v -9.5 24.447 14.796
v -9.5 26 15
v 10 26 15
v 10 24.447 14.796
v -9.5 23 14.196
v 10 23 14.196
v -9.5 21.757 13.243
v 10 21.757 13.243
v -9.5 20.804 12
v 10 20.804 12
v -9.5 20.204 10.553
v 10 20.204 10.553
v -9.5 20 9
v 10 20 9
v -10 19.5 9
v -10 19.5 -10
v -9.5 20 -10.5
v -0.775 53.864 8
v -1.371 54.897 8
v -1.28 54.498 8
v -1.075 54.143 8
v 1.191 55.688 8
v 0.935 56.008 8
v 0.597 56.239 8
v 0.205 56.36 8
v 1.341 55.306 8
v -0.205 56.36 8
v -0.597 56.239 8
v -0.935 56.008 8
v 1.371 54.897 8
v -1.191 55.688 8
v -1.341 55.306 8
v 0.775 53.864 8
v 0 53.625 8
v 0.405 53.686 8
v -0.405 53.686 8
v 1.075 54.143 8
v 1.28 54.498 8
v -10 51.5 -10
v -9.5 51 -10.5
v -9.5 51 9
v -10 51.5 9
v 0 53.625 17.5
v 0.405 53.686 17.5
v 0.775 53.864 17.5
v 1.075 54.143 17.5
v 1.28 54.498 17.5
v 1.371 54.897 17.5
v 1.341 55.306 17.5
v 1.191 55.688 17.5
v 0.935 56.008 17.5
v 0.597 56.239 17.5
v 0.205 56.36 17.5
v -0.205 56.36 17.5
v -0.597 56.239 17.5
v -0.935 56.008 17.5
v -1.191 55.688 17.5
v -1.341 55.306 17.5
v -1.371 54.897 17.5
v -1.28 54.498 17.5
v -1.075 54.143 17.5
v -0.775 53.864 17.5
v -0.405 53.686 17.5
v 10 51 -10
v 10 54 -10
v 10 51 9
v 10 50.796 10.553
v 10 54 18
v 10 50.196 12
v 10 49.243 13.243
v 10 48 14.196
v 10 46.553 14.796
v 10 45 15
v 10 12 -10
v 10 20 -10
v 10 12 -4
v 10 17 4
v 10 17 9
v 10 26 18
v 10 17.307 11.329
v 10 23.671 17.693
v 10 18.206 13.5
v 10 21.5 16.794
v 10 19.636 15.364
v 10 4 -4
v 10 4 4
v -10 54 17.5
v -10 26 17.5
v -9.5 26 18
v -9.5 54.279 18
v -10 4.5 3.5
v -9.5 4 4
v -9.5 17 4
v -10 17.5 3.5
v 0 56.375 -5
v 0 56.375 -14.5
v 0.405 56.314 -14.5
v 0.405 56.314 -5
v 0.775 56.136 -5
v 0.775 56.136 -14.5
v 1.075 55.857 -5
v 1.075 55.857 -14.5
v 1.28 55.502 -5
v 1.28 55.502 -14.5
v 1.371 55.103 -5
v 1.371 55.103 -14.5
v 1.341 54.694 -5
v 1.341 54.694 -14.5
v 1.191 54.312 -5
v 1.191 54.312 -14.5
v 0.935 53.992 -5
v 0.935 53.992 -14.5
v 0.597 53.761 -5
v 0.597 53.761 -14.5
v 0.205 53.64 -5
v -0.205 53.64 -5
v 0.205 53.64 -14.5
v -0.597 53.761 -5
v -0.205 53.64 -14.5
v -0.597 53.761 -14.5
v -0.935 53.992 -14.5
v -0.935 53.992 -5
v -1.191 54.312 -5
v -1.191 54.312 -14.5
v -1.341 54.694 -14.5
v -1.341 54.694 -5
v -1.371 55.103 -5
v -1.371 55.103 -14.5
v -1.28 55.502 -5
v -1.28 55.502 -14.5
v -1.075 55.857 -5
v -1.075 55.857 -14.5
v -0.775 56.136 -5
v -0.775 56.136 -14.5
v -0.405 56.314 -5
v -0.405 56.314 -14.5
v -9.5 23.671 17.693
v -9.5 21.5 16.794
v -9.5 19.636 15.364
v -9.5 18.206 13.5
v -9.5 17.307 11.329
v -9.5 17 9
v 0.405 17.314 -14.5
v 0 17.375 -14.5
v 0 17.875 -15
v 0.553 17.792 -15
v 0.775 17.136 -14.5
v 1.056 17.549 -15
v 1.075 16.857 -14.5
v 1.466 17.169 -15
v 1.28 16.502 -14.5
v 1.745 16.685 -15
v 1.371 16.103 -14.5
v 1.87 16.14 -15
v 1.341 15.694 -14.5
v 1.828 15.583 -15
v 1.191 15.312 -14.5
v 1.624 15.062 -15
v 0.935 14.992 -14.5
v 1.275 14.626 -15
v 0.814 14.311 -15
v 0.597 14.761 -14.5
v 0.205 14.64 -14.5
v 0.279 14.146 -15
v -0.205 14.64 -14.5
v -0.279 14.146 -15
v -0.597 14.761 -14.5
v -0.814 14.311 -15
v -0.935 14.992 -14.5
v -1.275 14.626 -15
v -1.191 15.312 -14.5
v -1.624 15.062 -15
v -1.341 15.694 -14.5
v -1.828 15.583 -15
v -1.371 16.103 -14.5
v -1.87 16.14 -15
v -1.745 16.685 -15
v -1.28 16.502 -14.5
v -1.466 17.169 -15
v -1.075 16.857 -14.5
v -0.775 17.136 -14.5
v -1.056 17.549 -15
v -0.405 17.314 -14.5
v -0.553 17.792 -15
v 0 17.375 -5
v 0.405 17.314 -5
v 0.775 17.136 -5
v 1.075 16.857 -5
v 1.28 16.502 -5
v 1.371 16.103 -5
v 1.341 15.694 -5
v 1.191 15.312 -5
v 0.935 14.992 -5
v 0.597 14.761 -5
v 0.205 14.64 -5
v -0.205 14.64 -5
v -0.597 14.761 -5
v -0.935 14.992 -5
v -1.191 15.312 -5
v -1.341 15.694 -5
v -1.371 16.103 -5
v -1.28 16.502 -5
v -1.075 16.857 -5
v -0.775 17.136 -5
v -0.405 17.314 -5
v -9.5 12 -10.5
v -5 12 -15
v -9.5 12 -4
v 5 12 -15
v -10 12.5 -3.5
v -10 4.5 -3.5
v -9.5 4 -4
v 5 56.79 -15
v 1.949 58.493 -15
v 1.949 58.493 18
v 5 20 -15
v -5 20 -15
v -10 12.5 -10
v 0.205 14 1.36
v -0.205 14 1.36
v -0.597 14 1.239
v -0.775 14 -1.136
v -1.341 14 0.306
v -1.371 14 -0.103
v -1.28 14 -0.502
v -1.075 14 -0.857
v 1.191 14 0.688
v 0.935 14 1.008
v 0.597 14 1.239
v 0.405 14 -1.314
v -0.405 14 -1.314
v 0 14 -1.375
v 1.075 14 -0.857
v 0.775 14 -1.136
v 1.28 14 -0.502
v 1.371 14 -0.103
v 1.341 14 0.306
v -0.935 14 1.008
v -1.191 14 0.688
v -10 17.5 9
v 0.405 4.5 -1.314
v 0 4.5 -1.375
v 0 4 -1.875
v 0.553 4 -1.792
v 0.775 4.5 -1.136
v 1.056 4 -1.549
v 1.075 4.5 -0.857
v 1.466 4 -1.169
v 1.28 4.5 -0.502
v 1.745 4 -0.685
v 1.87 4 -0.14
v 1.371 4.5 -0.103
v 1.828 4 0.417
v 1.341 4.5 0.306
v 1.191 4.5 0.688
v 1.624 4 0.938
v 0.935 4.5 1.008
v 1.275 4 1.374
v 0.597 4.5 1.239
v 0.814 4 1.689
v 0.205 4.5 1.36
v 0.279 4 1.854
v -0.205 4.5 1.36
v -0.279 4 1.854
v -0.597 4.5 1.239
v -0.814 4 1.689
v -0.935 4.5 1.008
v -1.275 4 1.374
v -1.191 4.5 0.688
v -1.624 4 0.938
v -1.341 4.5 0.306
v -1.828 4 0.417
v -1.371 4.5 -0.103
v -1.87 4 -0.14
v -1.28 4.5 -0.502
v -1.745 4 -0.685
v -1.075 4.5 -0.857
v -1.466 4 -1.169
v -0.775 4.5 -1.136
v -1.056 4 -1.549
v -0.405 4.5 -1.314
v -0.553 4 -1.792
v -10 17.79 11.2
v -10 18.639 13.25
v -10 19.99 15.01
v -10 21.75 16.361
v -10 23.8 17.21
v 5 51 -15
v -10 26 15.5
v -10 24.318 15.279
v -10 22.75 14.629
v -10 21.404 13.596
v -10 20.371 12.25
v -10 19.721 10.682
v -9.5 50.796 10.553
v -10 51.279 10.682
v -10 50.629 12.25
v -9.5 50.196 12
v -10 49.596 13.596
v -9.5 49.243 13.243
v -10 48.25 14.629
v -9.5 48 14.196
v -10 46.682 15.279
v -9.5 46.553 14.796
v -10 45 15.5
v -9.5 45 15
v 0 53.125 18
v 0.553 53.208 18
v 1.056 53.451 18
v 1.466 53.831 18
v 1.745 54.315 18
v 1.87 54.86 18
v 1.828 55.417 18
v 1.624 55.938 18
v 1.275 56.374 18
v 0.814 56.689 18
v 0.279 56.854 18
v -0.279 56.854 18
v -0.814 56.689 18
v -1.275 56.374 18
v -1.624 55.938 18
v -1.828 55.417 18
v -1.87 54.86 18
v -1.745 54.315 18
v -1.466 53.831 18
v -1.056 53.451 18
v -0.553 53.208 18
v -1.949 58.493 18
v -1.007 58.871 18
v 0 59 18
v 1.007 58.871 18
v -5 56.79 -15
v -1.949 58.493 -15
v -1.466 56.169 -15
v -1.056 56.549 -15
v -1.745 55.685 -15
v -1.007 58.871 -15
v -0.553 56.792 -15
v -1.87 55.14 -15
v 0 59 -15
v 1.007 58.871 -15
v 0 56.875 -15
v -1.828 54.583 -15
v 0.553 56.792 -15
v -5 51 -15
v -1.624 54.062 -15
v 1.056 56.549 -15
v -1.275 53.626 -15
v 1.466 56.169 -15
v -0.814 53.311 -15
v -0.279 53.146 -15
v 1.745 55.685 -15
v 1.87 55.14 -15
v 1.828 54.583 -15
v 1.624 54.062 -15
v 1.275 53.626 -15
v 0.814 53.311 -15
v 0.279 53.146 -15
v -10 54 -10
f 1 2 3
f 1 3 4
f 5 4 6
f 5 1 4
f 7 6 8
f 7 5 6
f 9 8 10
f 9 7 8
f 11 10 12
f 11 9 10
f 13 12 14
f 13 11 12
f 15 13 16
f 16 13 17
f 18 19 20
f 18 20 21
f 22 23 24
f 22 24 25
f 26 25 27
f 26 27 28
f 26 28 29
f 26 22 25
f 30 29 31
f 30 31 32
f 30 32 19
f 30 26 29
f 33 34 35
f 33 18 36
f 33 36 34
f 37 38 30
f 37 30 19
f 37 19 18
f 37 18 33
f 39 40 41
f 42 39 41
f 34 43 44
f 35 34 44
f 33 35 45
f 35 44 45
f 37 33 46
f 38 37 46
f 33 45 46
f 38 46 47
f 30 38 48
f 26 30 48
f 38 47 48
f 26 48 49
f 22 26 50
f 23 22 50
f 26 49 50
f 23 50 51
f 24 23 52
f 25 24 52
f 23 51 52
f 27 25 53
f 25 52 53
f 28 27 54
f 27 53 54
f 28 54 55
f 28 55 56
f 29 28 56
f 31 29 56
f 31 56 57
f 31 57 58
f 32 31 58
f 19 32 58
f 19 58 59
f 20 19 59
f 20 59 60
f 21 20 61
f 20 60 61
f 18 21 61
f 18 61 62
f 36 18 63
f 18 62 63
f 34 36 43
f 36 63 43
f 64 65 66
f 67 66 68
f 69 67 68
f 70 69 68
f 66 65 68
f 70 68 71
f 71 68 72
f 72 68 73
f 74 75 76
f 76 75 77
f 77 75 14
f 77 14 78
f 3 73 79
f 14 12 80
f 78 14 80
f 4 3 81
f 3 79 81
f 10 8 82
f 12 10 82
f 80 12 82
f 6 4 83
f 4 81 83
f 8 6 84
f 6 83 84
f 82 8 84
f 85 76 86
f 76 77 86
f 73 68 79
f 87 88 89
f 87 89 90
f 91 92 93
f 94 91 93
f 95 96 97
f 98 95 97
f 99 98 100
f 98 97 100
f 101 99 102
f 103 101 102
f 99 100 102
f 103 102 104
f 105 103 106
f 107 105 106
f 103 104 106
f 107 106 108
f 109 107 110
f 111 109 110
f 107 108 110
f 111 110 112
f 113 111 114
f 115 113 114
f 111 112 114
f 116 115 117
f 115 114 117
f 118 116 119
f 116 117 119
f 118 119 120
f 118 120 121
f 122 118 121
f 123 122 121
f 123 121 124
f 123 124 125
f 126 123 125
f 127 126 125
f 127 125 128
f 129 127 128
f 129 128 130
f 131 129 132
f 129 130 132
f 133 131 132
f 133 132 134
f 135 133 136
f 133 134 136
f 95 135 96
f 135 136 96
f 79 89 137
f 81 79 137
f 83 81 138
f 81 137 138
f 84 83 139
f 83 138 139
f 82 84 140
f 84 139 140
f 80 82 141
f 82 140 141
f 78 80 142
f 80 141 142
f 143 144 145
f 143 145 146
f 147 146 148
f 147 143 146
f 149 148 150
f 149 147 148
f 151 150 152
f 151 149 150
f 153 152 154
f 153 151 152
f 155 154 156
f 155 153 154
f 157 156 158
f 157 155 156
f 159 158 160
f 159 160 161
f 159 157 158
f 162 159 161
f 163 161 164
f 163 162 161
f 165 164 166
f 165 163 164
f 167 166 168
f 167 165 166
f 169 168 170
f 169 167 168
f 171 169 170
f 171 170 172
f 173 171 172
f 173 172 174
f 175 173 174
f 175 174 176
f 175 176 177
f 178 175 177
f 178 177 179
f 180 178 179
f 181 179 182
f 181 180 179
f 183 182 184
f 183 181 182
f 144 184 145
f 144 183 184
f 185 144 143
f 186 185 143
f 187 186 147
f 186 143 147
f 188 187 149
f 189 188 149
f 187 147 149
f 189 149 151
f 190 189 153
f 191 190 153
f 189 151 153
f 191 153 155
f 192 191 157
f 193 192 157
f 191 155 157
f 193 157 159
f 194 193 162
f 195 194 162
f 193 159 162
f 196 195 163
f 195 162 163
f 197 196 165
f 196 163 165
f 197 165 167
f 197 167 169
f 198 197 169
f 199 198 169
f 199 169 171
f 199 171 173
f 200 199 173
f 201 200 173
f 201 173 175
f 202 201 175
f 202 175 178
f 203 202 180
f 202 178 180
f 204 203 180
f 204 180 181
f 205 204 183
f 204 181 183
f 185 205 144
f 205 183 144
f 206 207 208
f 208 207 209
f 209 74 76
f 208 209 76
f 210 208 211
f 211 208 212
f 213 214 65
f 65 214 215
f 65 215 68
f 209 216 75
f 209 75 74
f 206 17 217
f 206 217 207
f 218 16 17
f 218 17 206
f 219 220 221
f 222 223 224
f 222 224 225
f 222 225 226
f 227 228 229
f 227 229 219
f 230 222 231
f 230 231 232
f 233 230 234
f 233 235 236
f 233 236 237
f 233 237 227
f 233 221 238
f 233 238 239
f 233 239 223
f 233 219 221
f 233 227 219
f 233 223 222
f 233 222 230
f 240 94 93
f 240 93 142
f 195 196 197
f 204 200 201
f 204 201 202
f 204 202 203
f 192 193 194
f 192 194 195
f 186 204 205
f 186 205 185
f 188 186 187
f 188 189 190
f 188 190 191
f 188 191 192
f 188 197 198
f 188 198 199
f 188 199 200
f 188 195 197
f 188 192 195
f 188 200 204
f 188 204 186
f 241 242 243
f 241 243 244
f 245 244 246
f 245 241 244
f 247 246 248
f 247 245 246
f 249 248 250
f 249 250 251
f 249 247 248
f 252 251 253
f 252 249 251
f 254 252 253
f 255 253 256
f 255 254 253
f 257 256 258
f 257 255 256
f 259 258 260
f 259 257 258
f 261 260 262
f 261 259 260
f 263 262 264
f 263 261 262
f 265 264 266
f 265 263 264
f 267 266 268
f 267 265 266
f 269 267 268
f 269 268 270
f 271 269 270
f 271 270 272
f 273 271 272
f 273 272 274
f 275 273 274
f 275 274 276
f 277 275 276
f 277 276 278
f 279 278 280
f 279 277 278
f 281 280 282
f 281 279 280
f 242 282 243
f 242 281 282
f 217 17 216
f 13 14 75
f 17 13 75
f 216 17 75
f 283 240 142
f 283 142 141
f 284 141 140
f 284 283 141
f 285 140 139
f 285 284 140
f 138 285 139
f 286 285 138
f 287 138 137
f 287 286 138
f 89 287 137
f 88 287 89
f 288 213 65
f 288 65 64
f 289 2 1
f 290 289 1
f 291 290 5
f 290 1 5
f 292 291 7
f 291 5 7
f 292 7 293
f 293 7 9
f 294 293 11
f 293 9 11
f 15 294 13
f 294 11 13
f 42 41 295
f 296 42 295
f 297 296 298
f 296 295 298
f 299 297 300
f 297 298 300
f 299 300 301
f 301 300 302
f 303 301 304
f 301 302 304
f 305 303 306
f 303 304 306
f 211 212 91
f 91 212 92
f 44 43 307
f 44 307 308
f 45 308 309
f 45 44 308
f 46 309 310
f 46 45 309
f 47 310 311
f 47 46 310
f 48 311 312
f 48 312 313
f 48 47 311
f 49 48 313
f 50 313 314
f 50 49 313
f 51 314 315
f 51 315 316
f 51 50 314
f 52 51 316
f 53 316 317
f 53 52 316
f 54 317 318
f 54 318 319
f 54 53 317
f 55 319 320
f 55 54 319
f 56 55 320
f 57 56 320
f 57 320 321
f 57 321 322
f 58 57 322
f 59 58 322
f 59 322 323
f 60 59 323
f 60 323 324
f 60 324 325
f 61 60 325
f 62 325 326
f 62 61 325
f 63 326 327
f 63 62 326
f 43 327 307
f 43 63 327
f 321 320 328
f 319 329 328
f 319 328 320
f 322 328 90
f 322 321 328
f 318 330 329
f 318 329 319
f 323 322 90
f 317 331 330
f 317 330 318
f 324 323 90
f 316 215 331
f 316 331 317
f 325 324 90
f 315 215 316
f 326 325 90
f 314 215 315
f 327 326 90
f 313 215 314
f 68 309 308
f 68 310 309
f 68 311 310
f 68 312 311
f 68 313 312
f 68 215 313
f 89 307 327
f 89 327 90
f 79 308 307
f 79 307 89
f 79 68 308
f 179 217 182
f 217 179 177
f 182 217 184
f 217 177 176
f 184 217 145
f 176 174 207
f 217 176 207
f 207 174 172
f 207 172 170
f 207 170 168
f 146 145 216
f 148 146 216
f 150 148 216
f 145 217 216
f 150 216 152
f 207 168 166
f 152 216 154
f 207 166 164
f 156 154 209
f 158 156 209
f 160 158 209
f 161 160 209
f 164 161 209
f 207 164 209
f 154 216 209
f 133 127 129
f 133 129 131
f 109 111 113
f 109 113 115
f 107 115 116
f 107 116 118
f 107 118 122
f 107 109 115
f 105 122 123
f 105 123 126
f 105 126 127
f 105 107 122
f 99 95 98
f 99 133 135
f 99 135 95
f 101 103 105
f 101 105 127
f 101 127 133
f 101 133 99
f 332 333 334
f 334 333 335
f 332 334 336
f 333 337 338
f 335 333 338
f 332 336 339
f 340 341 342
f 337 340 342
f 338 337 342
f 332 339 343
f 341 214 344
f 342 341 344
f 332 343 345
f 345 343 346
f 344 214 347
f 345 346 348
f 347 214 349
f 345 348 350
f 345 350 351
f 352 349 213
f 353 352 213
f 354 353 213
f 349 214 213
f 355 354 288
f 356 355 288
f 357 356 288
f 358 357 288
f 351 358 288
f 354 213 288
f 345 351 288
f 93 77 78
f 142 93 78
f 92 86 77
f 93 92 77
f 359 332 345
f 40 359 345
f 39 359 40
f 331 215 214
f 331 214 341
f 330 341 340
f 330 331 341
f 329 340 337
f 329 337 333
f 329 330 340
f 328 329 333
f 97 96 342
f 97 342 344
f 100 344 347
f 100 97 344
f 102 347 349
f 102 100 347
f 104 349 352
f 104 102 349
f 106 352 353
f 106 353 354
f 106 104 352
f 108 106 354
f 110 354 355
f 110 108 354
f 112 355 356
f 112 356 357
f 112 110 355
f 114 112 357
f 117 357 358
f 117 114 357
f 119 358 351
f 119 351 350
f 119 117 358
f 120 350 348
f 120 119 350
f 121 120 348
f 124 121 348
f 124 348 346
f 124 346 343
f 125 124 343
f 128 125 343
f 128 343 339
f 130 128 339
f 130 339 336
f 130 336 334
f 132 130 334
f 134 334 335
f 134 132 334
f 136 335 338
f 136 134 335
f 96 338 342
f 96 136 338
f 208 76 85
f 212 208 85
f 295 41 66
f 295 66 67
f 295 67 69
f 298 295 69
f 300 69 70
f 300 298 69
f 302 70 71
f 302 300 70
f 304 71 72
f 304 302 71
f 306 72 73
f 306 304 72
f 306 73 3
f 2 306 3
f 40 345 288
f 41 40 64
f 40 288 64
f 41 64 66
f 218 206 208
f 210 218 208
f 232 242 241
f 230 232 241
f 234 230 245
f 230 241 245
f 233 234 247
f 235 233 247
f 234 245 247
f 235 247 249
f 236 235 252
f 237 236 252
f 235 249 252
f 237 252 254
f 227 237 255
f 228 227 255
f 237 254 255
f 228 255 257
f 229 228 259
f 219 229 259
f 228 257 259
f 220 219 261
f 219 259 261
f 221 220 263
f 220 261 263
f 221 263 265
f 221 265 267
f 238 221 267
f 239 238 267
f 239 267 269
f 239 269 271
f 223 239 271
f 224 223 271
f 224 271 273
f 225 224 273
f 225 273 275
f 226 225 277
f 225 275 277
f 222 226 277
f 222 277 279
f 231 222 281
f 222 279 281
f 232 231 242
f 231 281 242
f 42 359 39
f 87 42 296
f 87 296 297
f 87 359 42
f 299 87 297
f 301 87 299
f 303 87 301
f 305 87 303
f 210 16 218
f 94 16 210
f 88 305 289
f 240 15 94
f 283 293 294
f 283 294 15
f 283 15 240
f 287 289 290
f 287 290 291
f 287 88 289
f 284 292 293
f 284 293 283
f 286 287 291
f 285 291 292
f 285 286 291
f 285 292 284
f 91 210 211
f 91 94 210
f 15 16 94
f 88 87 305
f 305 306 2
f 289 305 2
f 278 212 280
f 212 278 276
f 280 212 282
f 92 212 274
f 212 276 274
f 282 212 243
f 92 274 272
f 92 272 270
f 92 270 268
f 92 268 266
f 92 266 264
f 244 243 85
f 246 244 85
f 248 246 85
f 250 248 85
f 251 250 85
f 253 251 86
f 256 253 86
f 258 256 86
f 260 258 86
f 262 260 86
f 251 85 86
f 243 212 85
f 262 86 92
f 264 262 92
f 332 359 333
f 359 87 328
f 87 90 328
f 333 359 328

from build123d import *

# Parameters (mm, degrees)
PAD_DEPTH       = 10
SKETCH001_R     = 1.375
POCKET_DEPTH    = 10
PAD001_DEPTH    = 33
SKETCH003_R     = 1.375
POCKET001_DEPTH = 10
SKETCH004_R     = 1.375
POCKET002_DEPTH = 10
FILLET_1_R      = 9
FILLET_2_R      = 6
CHAMFER_SIZE    = 5
CHAMFER001_SIZE = 0.5
CHAMFER002_SIZE = 0.5


with BuildPart() as part:
    # Sketch → Pad (new body, symmetric)
    with BuildSketch(Plane.YZ):
        Polygon((4, 4), (17, 4), (17, 18), (54, 18), (54, -15), (51, -15), (51, 15), (20, 15), (20, -15), (12, -15), (12, -4), (4, -4), align=None)
    extrude(amount=PAD_DEPTH, both=True)

    # Sketch001 → Pocket (cut)
    with BuildSketch(Plane(origin=(0, 4, 0), x_dir=(0, 0, -1), z_dir=(0, -1, 0))):
        Circle(SKETCH001_R)
    extrude(amount=-POCKET_DEPTH, mode=Mode.SUBTRACT)

    # Sketch002 → Pad001 (new body)
    with BuildSketch(Plane(origin=(0, 0, 18), x_dir=(0, -1, 0), z_dir=(0, 0, 1))):
        with BuildLine():
            ThreePointArc((-58.492889, 1.949289), (-59, 0), (-58.492889, -1.949289))
            Line((-54, -10), (-58.492889, -1.949289))
            Line((-54, 10), (-54, -10))
            Line((-58.492889, 1.949289), (-54, 10))
        make_face()
    extrude(amount=-PAD001_DEPTH)

    # Sketch003 → Pocket001 (cut)
    with BuildSketch(Plane(origin=(0, 0, 18), x_dir=(0, -1, 0), z_dir=(0, 0, 1))):
        with Locations((-55, 0)):
            Circle(SKETCH003_R)
    extrude(amount=-POCKET001_DEPTH, mode=Mode.SUBTRACT)

    # Sketch004 → Pocket002 (cut)
    with BuildSketch(Plane.YX.offset(15)):
        with Locations((55, 0)):
            Circle(SKETCH004_R)
        with Locations((16, 0)):
            Circle(SKETCH004_R)
    extrude(amount=-POCKET002_DEPTH, mode=Mode.SUBTRACT)

    # Fillet 1
    fillet_1_edges = [part.edges().sort_by_distance(p)[0] for p in [
        (0, 17, 18),
    ]]
    fillet(fillet_1_edges, radius=FILLET_1_R)

    # Fillet 2
    fillet_2_edges = [part.edges().sort_by_distance(p)[0] for p in [
        (0, 20, 15),
        (0, 51, 15),
    ]]
    fillet(fillet_2_edges, radius=FILLET_2_R)

    # Chamfer
    chamfer_edges = [part.edges().sort_by_distance(p)[0] for p in [
        (-10, 52.5, -15),
        (-10, 16, -15),
        (10, 52.5, -15),
        (10, 16, -15),
    ]]
    chamfer(chamfer_edges, length=CHAMFER_SIZE)

    # Chamfer001
    chamfer001_edges = [part.edges().sort_by_distance(p)[0] for p in [
        (0, 56.375, 18),
        (0, 4, 1.375),
        (0, 53.625, -15),
        (0, 14.625, -15),
    ]]
    chamfer(chamfer001_edges, length=CHAMFER001_SIZE)

    # Chamfer002
    chamfer002_edges = [part.edges().sort_by_distance(p)[0] for p in [
        (-10, 40, 18),
        (-10, 51, -0.5),
        (-10, 19.636039, 15.363961),
        (-10, 49.242641, 13.242641),
        (-10, 17, 6.5),
        (-10, 35.5, 15),
        (-10, 10.5, 4),
        (-10, 21.757359, 13.242641),
        (-10, 4, 0),
        (-10, 20, -0.5),
        (-10, 8, -4),
        (-10, 12, -7),
    ]]
    chamfer(chamfer002_edges, length=CHAMFER002_SIZE)


solid = part.part
